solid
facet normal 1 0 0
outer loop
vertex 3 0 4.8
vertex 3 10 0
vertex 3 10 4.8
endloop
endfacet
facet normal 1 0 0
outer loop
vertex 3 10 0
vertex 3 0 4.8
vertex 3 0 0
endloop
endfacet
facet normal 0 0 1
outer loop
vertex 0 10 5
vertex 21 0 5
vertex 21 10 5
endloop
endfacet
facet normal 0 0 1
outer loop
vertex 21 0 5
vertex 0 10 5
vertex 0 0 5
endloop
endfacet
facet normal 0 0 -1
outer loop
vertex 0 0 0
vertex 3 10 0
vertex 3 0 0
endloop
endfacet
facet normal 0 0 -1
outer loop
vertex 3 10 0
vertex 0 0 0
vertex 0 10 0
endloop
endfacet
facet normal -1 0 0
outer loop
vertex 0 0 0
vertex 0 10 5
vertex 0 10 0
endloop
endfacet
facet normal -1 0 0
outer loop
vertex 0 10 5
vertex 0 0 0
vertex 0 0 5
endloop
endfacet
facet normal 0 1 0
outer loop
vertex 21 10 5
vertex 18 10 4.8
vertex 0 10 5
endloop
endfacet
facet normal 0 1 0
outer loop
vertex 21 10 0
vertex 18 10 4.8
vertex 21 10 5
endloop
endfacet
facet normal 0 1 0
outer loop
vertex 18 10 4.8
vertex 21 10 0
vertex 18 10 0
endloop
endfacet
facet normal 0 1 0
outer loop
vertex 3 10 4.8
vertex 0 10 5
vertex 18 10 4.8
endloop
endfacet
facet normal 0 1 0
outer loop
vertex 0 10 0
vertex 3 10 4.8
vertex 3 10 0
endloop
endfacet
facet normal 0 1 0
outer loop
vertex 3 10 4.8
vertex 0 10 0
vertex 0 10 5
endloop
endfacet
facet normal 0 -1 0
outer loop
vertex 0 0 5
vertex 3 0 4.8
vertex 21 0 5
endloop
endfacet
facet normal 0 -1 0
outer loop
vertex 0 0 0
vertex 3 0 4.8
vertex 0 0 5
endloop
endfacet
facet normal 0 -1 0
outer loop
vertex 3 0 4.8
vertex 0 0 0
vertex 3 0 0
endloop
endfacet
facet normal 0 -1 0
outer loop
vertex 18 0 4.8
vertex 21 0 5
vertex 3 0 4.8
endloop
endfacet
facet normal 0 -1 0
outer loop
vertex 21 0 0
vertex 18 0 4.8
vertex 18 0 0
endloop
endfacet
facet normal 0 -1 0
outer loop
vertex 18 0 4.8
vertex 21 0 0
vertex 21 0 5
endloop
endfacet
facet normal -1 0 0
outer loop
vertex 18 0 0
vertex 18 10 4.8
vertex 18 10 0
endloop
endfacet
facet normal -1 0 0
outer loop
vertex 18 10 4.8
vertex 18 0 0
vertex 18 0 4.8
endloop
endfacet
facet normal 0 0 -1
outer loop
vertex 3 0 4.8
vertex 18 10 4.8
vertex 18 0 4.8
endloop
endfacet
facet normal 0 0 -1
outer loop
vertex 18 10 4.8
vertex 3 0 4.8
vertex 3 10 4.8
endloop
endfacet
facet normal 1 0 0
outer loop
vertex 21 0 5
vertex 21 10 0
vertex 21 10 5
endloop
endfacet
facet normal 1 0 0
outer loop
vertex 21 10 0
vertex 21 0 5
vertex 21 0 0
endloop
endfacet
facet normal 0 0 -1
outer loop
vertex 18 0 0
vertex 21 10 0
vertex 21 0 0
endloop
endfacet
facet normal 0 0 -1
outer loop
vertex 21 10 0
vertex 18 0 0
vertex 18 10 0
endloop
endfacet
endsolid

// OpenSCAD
/**
 * bridge-test.scad
 * A simple part to test the bridge settings of a slicer.
 *
 * @author Nathan Campos <nathan@innoveworkshop.com>
 */

eps = 0.05;

// Side support dimensions. (W x D x H)
sw = 3;
sd = 10;
sh = 5;

// Bridge dimensions. (Thickness x Width)
bt = 0.2;
bw = 15;

union() {
	cube([sw, sd, sh]);
	translate([sw - eps, 0, sh - bt])
		cube([bw + eps, sd, bt]);
	translate([sw +bw, 0, 0])
		cube([sw, sd, sh]);
}
